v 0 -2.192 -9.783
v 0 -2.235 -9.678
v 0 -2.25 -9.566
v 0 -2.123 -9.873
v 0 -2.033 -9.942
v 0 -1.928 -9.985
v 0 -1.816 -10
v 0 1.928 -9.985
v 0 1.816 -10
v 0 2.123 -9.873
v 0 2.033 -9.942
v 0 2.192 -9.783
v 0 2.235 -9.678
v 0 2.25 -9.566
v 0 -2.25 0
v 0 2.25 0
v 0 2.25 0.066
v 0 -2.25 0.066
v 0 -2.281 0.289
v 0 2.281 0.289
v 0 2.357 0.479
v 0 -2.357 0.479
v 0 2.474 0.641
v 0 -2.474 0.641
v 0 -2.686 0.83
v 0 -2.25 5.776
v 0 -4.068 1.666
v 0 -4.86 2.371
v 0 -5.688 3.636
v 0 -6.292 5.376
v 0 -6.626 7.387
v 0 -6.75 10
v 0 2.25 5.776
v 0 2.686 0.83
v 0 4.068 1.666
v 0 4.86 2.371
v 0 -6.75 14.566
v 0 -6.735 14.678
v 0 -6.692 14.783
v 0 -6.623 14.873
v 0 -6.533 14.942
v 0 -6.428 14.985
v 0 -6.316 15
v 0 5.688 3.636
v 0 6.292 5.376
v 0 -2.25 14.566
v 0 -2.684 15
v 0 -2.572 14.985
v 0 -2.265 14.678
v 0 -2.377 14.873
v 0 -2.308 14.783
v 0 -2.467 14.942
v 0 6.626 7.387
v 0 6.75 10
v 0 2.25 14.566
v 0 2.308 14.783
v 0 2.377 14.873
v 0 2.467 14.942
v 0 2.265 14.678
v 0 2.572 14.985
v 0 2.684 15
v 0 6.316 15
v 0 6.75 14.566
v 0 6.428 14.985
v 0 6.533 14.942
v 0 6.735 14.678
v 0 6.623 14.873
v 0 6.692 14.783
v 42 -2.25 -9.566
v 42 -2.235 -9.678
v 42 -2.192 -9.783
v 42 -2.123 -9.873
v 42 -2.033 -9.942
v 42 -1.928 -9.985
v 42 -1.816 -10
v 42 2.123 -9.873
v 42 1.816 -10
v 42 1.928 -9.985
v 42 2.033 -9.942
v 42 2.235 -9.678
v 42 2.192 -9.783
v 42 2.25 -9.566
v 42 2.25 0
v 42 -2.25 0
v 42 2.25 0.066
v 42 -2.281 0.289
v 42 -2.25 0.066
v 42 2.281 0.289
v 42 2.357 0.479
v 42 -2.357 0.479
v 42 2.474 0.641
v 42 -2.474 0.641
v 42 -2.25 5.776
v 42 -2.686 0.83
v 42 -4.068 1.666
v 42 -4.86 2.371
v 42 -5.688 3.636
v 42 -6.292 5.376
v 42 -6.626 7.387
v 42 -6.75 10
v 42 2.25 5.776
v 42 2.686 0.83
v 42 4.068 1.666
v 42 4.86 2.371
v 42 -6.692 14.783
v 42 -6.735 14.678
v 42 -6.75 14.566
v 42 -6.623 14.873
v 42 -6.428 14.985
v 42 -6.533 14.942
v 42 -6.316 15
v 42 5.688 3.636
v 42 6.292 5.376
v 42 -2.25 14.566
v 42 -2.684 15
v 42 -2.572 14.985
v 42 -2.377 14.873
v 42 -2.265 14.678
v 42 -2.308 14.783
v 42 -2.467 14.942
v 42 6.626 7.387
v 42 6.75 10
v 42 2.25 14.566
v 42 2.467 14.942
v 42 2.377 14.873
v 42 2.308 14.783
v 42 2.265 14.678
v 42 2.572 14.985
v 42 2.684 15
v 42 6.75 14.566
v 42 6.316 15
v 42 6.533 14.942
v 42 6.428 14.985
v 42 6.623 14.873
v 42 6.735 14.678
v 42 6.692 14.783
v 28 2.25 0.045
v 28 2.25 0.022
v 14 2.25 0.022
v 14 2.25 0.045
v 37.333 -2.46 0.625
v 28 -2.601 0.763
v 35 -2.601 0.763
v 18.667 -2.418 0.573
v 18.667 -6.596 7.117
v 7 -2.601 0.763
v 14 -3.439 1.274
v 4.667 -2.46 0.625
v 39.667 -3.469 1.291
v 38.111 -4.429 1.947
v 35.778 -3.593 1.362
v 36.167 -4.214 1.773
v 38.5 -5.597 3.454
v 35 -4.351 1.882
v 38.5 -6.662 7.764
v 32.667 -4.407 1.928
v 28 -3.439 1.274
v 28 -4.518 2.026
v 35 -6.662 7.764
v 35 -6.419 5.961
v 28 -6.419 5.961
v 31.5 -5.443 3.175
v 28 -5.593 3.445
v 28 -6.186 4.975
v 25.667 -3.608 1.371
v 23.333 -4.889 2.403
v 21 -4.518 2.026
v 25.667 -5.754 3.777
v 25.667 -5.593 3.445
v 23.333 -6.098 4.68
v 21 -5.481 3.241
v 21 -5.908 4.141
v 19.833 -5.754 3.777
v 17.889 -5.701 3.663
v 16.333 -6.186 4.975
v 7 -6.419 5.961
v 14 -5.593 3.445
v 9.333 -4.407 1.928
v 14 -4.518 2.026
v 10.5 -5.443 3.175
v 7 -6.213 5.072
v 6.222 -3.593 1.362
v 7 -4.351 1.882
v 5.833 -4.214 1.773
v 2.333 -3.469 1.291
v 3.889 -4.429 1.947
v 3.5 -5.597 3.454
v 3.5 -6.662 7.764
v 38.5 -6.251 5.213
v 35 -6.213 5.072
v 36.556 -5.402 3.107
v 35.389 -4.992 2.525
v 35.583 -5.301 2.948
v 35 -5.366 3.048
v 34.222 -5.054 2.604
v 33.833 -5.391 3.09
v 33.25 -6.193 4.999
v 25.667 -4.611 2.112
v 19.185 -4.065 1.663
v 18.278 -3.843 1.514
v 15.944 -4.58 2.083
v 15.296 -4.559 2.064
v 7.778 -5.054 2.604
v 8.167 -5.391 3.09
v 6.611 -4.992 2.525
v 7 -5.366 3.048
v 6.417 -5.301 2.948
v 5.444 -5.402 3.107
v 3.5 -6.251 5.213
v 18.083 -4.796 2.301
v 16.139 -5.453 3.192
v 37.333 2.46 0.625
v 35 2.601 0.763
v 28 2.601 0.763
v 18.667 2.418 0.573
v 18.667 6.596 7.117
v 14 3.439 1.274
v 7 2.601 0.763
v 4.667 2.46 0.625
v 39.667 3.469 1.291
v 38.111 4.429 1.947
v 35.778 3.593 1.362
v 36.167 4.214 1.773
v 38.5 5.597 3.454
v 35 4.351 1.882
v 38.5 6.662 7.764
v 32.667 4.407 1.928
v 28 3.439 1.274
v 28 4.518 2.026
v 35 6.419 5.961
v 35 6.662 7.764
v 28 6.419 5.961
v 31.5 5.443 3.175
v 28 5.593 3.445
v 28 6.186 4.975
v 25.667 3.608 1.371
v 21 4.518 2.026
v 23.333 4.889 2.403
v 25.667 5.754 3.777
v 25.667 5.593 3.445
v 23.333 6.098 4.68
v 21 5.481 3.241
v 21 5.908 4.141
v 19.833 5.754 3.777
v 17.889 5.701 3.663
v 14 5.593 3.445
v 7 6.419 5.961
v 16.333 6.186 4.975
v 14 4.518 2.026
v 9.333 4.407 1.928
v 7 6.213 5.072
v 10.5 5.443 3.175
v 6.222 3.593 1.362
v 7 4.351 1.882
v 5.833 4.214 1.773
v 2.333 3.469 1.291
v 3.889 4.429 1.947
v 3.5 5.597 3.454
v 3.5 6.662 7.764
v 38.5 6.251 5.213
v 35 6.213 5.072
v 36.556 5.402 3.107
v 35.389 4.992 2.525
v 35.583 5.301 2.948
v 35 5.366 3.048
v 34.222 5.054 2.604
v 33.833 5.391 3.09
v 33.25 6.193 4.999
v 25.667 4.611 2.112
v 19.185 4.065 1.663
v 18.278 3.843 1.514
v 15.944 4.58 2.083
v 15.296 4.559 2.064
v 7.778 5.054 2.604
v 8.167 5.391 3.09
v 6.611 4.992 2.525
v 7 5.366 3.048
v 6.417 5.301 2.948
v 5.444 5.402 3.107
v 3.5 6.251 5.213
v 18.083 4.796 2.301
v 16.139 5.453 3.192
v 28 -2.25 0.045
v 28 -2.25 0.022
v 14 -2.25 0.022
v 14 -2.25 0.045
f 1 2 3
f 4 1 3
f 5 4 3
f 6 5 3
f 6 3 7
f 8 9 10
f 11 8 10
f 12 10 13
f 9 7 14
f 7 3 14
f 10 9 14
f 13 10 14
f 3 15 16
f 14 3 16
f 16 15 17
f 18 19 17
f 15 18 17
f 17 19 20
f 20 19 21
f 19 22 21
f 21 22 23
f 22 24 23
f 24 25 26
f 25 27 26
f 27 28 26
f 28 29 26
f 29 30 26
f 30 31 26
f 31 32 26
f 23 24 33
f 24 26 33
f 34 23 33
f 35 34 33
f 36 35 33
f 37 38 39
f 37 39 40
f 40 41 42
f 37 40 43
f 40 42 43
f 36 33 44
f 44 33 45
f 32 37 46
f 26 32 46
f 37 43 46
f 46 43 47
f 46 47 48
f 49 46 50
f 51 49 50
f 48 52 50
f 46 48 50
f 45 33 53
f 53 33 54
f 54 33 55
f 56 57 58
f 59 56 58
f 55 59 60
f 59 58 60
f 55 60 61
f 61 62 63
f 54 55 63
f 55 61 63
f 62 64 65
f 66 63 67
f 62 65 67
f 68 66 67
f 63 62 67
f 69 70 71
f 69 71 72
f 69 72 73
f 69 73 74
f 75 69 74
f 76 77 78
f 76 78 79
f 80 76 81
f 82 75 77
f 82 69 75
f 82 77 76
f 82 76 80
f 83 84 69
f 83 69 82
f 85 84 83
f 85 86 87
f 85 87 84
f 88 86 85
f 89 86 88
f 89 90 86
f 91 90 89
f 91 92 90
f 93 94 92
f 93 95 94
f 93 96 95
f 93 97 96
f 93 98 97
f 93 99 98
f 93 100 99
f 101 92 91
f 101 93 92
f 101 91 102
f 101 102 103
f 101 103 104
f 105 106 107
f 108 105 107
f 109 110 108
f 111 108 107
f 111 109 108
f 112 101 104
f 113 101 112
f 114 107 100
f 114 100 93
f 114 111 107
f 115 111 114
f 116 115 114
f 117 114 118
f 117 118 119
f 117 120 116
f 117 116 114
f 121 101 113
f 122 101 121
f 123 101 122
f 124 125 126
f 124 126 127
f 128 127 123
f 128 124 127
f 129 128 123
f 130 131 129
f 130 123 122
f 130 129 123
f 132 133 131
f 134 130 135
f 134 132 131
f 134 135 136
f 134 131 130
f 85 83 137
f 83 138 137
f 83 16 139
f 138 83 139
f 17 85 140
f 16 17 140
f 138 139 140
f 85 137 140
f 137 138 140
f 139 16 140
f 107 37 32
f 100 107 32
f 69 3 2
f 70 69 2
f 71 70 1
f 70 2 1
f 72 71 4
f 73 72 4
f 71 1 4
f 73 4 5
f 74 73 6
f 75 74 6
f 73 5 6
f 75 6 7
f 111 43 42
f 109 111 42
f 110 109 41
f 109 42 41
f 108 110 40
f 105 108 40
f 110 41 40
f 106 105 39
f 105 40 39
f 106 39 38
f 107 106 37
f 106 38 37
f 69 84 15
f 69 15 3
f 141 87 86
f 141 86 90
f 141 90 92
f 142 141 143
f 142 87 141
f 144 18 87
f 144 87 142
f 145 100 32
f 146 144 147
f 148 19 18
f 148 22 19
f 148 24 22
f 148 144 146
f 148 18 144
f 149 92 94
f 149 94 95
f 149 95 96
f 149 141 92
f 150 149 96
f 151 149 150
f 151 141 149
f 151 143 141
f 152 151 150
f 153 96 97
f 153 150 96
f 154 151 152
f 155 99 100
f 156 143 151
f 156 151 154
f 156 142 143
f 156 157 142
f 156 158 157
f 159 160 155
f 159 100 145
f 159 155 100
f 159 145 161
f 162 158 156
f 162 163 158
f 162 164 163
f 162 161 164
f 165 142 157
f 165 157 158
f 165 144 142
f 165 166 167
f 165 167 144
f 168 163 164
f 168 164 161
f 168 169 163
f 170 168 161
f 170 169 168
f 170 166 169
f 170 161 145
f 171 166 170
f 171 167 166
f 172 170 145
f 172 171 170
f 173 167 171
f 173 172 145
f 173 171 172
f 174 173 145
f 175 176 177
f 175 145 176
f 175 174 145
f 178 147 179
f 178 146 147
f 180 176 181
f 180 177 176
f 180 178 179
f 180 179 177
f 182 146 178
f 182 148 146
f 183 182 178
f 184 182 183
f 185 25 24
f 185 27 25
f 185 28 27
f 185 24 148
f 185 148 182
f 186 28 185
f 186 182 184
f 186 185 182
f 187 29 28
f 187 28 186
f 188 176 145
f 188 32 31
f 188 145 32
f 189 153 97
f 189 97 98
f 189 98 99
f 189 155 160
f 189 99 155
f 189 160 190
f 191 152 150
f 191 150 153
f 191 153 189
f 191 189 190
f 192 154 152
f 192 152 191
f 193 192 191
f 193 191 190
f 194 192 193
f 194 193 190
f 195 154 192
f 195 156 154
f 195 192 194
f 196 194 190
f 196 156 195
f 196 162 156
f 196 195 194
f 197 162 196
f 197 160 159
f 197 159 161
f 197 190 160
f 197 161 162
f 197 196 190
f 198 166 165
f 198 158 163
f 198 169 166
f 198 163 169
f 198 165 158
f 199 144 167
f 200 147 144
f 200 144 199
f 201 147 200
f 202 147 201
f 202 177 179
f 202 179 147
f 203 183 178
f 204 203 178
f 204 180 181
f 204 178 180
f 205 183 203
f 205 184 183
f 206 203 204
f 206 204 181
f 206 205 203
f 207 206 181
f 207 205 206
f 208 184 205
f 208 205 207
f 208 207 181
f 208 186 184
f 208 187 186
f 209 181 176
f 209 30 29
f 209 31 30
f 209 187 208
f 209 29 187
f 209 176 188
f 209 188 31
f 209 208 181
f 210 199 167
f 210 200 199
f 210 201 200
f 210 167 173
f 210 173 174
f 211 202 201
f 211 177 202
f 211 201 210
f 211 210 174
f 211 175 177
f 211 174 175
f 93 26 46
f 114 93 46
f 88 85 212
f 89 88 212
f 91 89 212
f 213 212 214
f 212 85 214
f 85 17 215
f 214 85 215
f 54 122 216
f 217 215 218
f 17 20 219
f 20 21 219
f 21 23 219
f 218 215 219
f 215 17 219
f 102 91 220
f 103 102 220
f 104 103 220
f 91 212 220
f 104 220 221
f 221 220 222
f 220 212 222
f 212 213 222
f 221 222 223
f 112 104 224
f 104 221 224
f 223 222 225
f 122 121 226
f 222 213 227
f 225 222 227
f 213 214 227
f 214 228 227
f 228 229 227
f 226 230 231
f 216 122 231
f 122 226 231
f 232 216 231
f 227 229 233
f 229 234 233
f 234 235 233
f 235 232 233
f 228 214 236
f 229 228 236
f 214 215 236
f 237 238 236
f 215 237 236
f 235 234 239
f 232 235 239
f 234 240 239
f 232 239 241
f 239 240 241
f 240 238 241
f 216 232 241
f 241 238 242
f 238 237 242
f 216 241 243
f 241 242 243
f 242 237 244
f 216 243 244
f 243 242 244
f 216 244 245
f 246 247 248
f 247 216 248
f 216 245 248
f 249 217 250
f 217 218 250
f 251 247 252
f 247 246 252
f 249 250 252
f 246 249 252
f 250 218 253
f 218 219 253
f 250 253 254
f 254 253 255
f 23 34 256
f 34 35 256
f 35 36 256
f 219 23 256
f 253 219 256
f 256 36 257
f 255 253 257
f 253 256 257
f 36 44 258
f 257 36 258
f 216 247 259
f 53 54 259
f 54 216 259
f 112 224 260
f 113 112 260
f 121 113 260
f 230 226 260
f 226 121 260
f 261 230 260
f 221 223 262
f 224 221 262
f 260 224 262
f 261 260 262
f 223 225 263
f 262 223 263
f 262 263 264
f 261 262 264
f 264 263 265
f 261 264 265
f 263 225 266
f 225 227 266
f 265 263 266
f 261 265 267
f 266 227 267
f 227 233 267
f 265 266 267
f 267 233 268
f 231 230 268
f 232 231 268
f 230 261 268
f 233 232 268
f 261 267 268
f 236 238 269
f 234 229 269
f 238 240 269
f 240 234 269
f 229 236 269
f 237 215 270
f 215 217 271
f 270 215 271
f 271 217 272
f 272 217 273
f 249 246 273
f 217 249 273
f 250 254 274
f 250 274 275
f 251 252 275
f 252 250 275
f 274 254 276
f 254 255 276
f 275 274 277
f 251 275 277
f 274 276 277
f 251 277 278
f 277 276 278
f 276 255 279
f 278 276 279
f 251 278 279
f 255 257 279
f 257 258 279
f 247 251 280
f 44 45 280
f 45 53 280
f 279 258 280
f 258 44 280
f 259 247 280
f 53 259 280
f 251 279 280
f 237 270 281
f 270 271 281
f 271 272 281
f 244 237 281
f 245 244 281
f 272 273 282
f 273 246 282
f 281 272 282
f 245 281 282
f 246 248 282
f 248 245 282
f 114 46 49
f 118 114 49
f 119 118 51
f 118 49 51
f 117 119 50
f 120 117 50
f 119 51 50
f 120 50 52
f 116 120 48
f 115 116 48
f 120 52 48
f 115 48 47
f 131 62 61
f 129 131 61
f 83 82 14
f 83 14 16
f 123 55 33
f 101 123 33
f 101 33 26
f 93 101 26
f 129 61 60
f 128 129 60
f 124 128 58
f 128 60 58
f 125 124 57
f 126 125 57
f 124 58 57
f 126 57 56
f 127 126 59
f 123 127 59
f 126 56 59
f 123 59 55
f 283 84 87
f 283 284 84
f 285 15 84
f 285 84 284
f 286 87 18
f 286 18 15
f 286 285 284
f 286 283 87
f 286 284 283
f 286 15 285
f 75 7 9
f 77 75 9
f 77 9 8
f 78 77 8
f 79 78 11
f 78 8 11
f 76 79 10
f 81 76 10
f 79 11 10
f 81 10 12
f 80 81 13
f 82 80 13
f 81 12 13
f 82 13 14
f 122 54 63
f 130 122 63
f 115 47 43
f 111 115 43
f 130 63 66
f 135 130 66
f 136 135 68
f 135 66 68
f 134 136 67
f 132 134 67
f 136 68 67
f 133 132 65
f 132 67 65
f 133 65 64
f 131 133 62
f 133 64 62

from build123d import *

# Parameters (mm, degrees)
F1_DEPTH = 42


with BuildPart() as f1:
    # F0 (on Right) → F1 (new body)
    with BuildSketch(Plane.YZ):
        with BuildLine():
            Line((2.25, 10), (6.75, 10))
            Line((6.75, 10), (6.75, 14.565794))
            ThreePointArc((6.75, 14.565794), (6.622824, 14.872824), (6.315794, 15))
            Line((6.315794, 15), (2.684206, 15))
            ThreePointArc((2.684206, 15), (2.377176, 14.872824), (2.25, 14.565794))
            Line((2.25, 14.565794), (2.25, 10))
        make_face()
        with BuildLine():
            Line((2.25, 5.776099), (2.25, 0.066271))
            add(Edge.make_bspline(
                [(2.25, 0.066271), (2.301244, 1.931495), (6.745765, 0.11442), (6.75, 10)],
                knots=[0.125472, 0.125472, 0.125472, 0.125472, 10.965856, 10.965856, 10.965856, 10.965856], degree=3))
            Line((6.75, 10), (2.25, 10))
            Line((2.25, 10), (2.25, 5.776099))
        make_face()
        with BuildLine():
            ThreePointArc((-2.25, -9.565794), (-2.122824, -9.872824), (-1.815794, -10))
            Line((-1.815794, -10), (1.815794, -10))
            ThreePointArc((1.815794, -10), (2.122824, -9.872824), (2.25, -9.565794))
            Line((2.25, -9.565794), (2.25, 0))
            add(Edge.make_bspline(
                [(2.25, 0), (2.249402, 0.022599), (2.249407, 0.044682), (2.25, 0.066271)],
                knots=[0, 0, 0, 0, 0.125472, 0.125472, 0.125472, 0.125472], degree=3))
            Line((2.25, 0.066271), (2.25, 5.776099))
            Line((2.25, 5.776099), (-2.25, 5.776099))
            Line((-2.25, 5.776099), (-2.25, 0.066271))
            add(Edge.make_bspline(
                [(-2.25, 0), (-2.249402, 0.022599), (-2.249407, 0.044682), (-2.25, 0.066271)],
                knots=[0, 0, 0, 0, 0.125472, 0.125472, 0.125472, 0.125472], degree=3))
            Line((-2.25, 0), (-2.25, -9.565794))
        make_face()
        with BuildLine():
            add(Edge.make_bspline(
                [(-2.25, 0.066271), (-2.301244, 1.931495), (-6.745765, 0.11442), (-6.75, 10)],
                knots=[0.125472, 0.125472, 0.125472, 0.125472, 10.965856, 10.965856, 10.965856, 10.965856], degree=3))
            Line((-2.25, 0.066271), (-2.25, 5.776099))
            Line((-2.25, 5.776099), (-2.25, 10))
            Line((-2.25, 10), (-6.75, 10))
        make_face()
        with BuildLine():
            Line((-6.75, 14.565794), (-6.75, 10))
            Line((-6.75, 10), (-2.25, 10))
            Line((-2.25, 10), (-2.25, 14.565794))
            ThreePointArc((-2.25, 14.565794), (-2.377176, 14.872824), (-2.684206, 15))
            Line((-2.684206, 15), (-6.315794, 15))
            ThreePointArc((-6.315794, 15), (-6.622824, 14.872824), (-6.75, 14.565794))
        make_face()
    extrude(amount=F1_DEPTH)


solid = f1.part
